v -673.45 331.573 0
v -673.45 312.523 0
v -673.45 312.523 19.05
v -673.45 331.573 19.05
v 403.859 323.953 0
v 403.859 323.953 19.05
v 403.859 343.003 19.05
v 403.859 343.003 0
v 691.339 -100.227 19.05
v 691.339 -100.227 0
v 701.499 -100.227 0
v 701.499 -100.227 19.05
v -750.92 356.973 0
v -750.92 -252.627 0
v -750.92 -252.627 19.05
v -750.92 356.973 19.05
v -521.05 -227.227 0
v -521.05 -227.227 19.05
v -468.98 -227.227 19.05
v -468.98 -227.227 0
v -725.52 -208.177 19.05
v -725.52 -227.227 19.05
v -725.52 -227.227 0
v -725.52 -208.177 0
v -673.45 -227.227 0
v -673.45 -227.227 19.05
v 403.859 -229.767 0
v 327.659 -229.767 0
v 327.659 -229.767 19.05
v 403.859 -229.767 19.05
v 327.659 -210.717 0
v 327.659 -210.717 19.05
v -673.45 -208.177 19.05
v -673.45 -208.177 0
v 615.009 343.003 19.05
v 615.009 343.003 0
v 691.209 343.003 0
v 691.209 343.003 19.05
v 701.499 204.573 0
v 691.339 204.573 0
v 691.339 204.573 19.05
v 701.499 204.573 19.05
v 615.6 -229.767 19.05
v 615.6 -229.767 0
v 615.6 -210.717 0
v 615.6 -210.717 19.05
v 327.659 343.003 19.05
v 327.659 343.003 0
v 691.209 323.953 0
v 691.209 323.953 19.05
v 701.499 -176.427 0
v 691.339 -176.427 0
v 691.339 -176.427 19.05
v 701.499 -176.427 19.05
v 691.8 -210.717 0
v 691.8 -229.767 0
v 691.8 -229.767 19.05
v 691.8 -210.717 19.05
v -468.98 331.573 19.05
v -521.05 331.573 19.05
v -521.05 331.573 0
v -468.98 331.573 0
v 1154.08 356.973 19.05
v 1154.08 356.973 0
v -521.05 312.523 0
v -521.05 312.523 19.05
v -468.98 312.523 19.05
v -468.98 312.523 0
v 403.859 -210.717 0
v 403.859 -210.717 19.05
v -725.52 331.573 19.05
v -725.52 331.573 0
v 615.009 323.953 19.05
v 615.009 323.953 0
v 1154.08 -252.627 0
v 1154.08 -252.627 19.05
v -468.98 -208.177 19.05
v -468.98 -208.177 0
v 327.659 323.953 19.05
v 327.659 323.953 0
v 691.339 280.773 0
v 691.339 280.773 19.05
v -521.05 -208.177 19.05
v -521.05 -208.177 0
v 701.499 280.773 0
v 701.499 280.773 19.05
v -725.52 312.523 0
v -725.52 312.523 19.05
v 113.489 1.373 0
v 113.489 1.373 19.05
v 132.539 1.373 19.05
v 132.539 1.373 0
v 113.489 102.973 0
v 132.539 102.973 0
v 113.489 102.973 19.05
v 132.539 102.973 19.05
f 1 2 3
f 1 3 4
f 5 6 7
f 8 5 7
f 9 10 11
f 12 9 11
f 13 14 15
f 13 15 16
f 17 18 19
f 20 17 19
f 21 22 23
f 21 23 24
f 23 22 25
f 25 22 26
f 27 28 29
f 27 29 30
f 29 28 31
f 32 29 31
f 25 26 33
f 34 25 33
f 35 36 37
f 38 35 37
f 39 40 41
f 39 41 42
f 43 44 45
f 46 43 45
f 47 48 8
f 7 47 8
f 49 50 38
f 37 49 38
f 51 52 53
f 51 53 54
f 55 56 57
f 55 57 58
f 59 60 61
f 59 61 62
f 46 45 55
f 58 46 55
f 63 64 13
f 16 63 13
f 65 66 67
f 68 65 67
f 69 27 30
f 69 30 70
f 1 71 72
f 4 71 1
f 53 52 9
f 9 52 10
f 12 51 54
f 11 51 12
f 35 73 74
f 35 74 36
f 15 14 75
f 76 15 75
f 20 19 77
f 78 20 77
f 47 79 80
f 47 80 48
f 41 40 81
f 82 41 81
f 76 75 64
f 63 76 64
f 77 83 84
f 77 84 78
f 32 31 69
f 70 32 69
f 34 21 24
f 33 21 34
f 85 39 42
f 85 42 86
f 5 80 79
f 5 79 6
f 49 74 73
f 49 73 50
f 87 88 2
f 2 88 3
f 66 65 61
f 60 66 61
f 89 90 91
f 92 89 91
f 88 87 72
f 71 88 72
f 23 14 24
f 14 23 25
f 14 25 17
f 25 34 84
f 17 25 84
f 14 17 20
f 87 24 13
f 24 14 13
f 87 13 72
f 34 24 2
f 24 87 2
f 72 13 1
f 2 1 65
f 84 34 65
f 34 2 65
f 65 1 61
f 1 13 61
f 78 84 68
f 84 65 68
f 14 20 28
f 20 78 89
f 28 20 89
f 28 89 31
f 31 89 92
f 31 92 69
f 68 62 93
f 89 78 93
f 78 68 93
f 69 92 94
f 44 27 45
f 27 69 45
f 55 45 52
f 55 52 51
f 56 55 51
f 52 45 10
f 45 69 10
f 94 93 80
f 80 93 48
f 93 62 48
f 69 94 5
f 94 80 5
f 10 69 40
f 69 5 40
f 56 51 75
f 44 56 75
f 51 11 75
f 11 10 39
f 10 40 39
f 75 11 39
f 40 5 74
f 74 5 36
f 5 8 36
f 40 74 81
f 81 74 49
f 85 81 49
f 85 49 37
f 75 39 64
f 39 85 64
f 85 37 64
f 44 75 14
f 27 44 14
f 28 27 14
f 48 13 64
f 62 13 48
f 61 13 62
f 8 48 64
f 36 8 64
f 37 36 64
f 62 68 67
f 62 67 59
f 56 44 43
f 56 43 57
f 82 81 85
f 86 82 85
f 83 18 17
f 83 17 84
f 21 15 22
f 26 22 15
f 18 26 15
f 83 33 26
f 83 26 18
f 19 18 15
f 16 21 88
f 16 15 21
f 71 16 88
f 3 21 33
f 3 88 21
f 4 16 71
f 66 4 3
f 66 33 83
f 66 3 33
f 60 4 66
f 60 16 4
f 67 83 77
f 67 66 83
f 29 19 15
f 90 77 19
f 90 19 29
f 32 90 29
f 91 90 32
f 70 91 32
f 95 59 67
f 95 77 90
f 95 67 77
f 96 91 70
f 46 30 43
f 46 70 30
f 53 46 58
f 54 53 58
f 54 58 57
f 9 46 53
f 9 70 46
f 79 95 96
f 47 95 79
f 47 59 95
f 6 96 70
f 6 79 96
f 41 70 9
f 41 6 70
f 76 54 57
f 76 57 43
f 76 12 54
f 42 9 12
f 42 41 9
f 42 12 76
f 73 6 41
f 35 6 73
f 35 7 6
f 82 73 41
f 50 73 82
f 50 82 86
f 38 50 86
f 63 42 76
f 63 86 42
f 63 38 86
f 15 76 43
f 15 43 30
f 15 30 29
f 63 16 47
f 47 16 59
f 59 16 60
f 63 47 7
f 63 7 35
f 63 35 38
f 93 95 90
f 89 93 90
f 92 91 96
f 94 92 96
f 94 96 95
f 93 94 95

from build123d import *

# Parameters (mm, degrees)
F0_W     = 304.8
F0_H     = 609.6
F0_W_2   = 76.2
F0_H_2   = 19.05
F0_W_3   = 10.16
F0_H_3   = 76.2
F1_DEPTH = 19.05
F3_DEPTH = 19.05
F6_W     = 52.07
F6_H     = 19.05
F7_DEPTH = 19.05


with BuildPart() as f1:
    # F0 (on Top) → F1 (new body)
    with BuildSketch(Plane.XY):
        with Locations((-598.51975, 52.173435)):
            Rectangle(F0_W, F0_H)
        Polygon((239.68025, 356.973435), (-446.11975, 356.973435), (-446.11975, -252.626565), (239.68025, -252.626565), (696.88025, -252.626565), (1154.08025, -252.626565), (1154.08025, 356.973435), (696.88025, 356.973435), align=None)
        with Locations((365.758981, -220.241565)):
            Rectangle(F0_W_2, F0_H_2, mode=Mode.SUBTRACT)
        with Locations((653.70025, -220.241565)):
            Rectangle(F0_W_2, F0_H_2, mode=Mode.SUBTRACT)
        with Locations((696.419128, -138.326565)):
            Rectangle(F0_W_3, F0_H_3, mode=Mode.SUBTRACT)
        with Locations((365.758981, 333.478435)):
            Rectangle(F0_W_2, F0_H_2, mode=Mode.SUBTRACT)
        with Locations((653.109181, 333.478435)):
            Rectangle(F0_W_2, F0_H_2, mode=Mode.SUBTRACT)
        with Locations((696.419128, 242.673435)):
            Rectangle(F0_W_3, F0_H_3, mode=Mode.SUBTRACT)
    extrude(amount=F1_DEPTH)

    # F2 (on face) → F3 (cut)
    with BuildSketch(Plane.XY.offset(19.05)):
        Polygon((132.539128, 1.373435), (132.539128, 52.173435), (132.539128, 102.973435), (113.489128, 102.973435), (113.489128, 1.373435), align=None)
    extrude(amount=-F3_DEPTH, mode=Mode.SUBTRACT)

    # F6 (on face) → F7 (cut)
    with BuildSketch(Plane.XY.offset(19.05)):
        with Locations((-699.48475, -217.701565)):
            Rectangle(F6_W, F6_H)
        with Locations((-495.01475, -217.701565)):
            Rectangle(F6_W, F6_H)
        with Locations((-495.01475, 322.048435)):
            Rectangle(F6_W, F6_H)
        with Locations((-699.48475, 322.048435)):
            Rectangle(F6_W, F6_H)
    extrude(amount=-F7_DEPTH, mode=Mode.SUBTRACT)


solid = f1.part
